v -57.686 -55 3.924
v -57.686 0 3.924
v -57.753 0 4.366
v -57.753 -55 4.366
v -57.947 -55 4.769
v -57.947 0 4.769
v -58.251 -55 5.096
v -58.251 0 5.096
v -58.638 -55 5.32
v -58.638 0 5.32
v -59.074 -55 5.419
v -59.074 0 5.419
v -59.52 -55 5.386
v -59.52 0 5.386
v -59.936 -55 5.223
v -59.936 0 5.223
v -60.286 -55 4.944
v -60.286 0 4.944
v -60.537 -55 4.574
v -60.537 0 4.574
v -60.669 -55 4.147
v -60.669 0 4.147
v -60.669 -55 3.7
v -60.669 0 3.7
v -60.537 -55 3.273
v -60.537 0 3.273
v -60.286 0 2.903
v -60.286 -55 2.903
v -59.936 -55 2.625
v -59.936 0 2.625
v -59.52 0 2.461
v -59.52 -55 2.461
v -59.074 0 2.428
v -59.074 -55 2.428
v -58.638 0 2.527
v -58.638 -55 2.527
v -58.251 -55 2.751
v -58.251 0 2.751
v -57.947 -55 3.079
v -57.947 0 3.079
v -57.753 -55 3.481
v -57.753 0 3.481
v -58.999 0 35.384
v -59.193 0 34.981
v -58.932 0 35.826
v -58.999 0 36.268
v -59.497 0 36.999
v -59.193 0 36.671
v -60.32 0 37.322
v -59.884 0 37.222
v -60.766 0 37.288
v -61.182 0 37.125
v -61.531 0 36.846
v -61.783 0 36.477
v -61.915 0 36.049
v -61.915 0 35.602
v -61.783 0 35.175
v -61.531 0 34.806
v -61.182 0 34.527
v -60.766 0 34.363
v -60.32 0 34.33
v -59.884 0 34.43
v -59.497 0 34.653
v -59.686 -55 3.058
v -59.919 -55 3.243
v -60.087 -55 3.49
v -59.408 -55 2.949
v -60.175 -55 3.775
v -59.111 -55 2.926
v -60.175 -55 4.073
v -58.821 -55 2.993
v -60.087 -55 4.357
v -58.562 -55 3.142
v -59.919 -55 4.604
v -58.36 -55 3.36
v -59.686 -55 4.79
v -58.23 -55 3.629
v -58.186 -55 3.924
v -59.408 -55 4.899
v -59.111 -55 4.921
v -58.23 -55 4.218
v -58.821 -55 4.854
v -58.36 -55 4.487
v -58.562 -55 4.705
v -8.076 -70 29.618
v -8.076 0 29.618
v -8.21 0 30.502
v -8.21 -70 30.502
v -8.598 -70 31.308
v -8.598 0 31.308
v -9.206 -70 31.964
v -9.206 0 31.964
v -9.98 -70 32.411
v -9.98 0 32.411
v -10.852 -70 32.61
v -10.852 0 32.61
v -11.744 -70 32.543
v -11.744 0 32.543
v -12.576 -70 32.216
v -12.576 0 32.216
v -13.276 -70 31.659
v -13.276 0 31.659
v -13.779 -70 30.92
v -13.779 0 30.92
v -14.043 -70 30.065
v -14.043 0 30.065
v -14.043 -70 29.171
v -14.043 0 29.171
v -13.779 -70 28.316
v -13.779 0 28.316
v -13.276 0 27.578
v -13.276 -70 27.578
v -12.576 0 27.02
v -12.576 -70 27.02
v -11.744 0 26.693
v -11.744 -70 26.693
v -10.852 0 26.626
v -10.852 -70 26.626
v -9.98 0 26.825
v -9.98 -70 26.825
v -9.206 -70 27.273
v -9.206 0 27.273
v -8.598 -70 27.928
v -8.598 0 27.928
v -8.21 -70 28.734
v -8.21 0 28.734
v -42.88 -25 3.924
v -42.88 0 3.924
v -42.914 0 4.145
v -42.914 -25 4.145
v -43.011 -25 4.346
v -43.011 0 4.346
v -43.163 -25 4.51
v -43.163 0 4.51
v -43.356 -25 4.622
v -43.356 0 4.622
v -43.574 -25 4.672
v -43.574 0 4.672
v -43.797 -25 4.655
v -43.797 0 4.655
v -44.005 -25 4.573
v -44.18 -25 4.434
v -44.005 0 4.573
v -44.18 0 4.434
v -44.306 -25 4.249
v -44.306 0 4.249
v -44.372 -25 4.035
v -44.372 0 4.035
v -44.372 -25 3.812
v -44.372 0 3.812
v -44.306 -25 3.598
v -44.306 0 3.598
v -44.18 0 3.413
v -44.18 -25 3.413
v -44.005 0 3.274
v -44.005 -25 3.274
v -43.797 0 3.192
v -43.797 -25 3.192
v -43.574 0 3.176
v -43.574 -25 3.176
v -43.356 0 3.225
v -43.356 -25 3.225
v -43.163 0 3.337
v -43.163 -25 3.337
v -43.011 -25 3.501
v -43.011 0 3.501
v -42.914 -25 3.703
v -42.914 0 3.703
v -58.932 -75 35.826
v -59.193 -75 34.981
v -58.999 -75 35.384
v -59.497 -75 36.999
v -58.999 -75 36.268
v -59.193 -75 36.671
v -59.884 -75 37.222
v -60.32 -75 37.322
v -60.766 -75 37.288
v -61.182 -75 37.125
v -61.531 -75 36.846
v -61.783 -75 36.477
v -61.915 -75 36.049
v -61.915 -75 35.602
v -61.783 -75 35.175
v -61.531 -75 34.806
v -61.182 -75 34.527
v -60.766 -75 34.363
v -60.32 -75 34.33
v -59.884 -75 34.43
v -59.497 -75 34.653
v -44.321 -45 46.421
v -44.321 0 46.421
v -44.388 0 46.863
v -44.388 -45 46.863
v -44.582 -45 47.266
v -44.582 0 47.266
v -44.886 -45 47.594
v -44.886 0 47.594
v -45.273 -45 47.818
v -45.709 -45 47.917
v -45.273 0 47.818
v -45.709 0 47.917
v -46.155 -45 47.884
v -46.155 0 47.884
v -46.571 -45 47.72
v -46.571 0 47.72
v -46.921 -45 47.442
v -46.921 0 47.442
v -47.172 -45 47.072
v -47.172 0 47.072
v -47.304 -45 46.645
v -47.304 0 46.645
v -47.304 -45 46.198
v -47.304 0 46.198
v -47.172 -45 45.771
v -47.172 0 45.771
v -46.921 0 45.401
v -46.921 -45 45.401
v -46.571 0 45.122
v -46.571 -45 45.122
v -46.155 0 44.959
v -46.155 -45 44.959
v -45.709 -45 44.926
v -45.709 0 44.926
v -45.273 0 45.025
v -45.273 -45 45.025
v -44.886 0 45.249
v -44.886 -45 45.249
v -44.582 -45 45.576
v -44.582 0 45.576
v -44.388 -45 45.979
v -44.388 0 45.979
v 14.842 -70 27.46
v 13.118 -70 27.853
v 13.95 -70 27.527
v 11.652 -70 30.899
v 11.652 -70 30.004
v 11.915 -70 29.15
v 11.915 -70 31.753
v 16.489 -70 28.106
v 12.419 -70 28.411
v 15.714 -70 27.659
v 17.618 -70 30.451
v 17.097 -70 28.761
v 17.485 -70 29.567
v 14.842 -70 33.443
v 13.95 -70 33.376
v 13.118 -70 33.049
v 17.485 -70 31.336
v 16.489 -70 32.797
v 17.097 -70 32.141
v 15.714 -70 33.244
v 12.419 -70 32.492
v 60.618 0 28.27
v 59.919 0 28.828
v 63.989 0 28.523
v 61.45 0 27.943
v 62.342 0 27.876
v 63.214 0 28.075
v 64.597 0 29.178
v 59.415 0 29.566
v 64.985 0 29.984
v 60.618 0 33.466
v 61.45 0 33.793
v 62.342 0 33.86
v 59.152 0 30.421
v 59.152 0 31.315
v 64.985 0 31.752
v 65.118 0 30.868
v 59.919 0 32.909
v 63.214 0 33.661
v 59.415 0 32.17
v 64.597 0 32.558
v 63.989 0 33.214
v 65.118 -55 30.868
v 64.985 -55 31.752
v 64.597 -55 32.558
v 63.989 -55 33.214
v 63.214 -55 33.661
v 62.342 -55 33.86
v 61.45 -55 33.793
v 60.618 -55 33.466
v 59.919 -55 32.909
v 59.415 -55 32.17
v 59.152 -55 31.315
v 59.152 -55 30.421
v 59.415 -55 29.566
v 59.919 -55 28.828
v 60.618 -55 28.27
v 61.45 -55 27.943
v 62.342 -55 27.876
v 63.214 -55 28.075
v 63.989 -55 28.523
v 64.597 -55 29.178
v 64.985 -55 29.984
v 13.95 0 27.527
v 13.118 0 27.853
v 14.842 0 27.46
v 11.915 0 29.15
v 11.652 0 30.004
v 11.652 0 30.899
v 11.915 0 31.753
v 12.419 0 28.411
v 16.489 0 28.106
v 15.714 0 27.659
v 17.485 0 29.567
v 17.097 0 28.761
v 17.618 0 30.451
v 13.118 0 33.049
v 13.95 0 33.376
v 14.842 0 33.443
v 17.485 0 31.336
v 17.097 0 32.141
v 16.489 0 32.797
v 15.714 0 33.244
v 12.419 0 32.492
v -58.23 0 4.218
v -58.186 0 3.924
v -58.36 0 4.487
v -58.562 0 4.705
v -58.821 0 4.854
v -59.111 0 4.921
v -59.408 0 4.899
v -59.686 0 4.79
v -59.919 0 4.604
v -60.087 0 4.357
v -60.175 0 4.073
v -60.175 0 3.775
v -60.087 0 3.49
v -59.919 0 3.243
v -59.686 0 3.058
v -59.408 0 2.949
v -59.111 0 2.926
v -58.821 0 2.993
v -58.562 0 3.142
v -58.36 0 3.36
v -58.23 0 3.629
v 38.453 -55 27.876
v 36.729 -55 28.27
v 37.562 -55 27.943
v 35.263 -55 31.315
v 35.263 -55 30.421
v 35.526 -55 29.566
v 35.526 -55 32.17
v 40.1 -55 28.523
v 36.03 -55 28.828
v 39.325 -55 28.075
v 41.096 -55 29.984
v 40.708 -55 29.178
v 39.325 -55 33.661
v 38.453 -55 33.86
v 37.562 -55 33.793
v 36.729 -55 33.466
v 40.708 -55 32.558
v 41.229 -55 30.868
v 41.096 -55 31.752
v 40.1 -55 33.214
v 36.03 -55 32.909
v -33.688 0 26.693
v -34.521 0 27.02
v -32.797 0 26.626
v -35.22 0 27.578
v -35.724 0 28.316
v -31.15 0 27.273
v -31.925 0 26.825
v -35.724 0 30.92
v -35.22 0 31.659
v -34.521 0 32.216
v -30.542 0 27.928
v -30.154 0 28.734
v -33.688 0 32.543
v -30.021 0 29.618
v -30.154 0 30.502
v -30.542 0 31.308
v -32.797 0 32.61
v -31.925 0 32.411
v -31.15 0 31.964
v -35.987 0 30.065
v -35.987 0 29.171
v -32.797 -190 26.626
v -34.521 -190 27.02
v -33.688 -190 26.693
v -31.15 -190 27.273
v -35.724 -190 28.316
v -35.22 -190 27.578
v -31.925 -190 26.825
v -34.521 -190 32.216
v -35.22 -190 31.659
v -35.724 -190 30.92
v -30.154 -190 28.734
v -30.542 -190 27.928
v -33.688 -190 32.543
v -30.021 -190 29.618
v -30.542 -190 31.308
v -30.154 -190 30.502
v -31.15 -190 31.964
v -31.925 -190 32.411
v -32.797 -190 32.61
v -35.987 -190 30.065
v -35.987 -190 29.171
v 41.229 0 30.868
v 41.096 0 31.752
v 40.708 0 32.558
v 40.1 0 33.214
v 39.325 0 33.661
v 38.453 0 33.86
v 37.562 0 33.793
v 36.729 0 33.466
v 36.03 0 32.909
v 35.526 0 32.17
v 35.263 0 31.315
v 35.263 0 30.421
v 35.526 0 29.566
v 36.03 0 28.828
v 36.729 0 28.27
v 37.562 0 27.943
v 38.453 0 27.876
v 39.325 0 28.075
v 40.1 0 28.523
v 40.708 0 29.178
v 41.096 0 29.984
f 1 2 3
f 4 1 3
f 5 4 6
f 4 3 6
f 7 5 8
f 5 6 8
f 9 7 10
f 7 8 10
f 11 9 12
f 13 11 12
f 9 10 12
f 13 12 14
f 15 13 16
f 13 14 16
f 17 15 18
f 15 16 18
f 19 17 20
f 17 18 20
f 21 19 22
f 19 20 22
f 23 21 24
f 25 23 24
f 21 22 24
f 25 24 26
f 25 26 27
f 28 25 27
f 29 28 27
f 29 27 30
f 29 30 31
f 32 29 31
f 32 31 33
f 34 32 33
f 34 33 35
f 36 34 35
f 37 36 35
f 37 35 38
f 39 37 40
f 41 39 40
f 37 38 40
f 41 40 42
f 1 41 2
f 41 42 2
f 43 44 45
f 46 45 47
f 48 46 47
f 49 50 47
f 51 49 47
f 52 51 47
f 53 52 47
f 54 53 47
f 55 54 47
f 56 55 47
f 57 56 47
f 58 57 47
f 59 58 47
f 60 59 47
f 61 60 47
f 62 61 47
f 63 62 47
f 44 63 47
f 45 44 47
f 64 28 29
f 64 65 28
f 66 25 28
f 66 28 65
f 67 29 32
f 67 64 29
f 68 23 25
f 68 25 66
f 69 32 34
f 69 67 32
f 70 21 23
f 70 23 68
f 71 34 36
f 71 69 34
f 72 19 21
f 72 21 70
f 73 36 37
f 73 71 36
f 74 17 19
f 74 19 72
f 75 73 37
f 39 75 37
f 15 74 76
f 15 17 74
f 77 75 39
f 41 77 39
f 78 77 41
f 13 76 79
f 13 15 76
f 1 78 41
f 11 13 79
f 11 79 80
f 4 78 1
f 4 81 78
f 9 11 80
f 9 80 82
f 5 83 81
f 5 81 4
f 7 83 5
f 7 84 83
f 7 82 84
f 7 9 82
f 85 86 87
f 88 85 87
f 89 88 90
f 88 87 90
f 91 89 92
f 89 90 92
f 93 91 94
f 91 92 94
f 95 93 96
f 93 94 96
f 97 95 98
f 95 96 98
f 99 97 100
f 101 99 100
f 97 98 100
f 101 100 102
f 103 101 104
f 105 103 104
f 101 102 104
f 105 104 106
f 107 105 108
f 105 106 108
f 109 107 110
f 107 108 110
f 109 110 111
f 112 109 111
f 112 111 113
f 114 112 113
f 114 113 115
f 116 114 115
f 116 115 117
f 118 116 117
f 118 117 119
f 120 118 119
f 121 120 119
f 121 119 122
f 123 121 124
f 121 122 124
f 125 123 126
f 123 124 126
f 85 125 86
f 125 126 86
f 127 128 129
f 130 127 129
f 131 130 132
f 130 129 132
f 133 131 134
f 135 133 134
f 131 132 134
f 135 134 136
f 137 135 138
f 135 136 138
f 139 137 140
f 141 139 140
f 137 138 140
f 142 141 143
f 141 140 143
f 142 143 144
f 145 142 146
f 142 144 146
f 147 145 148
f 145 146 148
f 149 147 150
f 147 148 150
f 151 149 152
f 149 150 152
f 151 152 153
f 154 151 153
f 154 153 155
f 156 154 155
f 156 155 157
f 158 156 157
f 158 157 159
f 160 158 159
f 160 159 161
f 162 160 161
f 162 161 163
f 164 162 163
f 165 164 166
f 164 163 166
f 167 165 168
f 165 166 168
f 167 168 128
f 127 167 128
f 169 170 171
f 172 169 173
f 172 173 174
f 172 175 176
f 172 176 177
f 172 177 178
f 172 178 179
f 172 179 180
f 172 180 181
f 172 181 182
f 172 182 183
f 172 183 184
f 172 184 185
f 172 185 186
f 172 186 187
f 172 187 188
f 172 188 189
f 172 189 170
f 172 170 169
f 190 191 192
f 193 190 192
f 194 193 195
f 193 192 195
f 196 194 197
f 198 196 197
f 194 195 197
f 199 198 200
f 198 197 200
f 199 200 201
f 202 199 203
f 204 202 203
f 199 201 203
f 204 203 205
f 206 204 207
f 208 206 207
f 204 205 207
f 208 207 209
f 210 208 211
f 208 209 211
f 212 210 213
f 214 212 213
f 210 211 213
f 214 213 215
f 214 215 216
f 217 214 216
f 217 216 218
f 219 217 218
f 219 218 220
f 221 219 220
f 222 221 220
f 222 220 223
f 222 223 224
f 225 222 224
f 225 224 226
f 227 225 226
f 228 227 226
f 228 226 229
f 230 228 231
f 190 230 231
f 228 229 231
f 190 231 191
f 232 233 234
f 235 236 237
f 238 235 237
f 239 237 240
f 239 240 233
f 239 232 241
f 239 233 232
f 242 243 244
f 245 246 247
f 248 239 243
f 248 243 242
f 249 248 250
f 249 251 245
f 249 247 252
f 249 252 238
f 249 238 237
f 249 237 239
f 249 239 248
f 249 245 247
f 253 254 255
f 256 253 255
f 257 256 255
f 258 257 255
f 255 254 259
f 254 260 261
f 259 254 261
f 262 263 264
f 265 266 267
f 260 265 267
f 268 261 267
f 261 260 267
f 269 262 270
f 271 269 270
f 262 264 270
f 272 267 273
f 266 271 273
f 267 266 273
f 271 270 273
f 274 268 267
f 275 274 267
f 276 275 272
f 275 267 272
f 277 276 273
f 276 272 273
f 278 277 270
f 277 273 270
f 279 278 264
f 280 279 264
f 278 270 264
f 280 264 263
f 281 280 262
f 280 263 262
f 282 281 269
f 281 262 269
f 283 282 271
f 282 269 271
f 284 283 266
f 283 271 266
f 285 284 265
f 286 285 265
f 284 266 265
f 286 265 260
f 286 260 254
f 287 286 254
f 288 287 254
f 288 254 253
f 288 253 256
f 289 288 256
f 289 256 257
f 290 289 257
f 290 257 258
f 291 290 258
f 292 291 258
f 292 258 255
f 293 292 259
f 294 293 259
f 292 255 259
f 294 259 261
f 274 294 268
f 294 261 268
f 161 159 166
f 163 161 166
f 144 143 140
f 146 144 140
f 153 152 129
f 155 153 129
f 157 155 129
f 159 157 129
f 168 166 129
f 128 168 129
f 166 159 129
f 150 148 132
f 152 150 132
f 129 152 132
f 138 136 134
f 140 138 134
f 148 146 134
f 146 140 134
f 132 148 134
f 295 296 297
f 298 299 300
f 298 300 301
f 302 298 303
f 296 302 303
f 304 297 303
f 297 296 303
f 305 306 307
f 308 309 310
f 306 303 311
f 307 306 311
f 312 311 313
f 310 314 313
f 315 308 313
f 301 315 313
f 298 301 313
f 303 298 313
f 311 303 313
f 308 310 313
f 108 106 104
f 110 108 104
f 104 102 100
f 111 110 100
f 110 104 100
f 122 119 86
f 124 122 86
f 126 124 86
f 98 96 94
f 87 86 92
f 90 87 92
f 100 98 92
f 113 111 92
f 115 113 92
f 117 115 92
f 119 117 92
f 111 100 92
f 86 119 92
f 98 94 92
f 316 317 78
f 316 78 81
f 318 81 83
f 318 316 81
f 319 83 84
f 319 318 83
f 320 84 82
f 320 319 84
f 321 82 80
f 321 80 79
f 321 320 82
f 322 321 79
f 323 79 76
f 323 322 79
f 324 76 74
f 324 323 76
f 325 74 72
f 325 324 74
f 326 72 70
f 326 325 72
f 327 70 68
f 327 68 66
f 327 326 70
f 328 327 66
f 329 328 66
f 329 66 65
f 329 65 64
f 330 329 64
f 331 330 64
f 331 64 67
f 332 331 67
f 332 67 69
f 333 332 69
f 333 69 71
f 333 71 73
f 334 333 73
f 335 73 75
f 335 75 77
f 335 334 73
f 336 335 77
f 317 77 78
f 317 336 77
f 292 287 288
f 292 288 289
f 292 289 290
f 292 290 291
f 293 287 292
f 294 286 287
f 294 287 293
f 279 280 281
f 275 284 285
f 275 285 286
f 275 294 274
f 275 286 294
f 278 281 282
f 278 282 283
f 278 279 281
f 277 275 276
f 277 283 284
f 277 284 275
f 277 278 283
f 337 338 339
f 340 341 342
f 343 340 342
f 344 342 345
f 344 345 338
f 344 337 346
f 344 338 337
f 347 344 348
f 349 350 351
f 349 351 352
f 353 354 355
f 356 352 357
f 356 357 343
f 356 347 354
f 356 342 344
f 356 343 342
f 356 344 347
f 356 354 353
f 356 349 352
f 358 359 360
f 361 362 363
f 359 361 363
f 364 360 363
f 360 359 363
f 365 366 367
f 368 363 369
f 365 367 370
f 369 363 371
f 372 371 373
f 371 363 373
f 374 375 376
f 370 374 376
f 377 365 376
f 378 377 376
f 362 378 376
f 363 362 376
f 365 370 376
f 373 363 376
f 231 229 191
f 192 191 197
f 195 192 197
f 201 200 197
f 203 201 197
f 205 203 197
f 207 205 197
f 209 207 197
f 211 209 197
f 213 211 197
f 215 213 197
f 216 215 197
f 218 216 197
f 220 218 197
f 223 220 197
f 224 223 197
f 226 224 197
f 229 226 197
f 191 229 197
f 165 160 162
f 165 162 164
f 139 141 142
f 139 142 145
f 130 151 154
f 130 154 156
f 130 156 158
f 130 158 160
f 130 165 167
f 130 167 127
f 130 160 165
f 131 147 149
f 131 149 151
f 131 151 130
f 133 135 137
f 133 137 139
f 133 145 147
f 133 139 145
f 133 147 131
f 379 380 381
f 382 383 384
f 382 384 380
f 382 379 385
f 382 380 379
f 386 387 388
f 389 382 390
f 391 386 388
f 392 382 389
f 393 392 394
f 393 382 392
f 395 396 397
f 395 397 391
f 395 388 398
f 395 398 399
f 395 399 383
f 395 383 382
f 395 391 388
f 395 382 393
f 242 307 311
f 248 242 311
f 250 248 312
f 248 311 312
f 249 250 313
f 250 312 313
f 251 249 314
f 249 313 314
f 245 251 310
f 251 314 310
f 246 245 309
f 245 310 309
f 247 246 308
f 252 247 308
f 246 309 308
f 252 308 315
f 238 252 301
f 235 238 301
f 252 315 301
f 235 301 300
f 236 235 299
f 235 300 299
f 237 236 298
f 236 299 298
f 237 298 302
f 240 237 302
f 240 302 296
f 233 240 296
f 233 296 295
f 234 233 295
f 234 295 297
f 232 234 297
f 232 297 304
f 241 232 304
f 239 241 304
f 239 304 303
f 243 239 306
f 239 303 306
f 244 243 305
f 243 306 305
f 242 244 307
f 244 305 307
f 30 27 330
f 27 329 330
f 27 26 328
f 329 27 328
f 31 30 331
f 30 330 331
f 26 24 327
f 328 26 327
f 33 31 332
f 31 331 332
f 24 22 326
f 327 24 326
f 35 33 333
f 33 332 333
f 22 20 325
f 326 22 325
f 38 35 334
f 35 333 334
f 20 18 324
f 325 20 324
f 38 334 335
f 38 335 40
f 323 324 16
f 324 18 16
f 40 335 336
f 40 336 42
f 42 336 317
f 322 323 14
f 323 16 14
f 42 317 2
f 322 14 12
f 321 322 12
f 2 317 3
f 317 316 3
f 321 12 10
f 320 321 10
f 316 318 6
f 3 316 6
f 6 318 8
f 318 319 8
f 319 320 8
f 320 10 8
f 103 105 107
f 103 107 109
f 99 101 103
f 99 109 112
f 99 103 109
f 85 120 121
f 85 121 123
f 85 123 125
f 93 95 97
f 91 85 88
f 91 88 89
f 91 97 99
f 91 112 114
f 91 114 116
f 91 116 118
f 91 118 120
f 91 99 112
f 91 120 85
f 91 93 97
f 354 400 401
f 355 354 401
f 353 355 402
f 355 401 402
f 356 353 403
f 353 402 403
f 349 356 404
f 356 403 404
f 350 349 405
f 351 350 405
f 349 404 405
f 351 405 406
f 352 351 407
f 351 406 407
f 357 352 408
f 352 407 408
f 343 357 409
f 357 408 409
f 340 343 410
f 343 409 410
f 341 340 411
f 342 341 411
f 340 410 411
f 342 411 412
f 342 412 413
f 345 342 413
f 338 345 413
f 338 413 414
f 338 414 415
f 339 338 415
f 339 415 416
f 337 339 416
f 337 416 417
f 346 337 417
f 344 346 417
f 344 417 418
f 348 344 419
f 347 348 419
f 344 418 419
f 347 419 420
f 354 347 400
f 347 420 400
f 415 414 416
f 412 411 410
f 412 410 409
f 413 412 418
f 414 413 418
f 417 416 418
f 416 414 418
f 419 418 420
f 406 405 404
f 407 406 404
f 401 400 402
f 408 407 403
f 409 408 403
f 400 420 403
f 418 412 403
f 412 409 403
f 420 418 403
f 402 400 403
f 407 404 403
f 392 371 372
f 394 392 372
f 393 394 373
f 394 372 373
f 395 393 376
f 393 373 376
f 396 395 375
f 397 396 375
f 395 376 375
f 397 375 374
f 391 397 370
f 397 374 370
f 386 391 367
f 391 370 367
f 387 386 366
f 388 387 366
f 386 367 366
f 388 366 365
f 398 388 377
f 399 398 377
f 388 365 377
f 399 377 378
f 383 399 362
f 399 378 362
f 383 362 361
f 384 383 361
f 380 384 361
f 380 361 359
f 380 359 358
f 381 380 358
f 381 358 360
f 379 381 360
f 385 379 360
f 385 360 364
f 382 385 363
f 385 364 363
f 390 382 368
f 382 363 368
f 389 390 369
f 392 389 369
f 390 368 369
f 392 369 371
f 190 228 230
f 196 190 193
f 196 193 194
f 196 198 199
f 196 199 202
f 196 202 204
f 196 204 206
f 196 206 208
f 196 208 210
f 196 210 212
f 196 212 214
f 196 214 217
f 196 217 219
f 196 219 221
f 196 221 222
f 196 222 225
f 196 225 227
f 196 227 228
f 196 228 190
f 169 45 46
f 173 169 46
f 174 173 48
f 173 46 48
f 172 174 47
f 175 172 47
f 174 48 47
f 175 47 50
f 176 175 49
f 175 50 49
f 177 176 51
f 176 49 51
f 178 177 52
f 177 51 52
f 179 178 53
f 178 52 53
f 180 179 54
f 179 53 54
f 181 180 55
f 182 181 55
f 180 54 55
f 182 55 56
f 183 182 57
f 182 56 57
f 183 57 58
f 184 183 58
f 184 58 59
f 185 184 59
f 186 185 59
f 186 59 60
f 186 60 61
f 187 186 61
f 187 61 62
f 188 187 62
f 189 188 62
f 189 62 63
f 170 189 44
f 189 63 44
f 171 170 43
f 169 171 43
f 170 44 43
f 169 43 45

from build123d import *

# Parameters (mm, degrees)
F0_R     = 3
F1_DEPTH = 190
F2_DEPTH = 70
F3_DEPTH = 55
F4_DEPTH = 55
F0_R_2   = 1.5
F5_DEPTH = 75
F6_DEPTH = 45
F0_R_3   = 1
F7_DEPTH = 55
F0_R_4   = 0.75
F8_DEPTH = 25


with BuildPart() as f1:
    # F0 (on Front) → F1 (new body)
    with BuildSketch(Plane.XZ):
        with Locations((-33.020835, 29.618056)):
            Circle(F0_R)
    extrude(amount=F1_DEPTH)


with BuildPart() as f2:
    # F0 (on Front) → F2 (new body)
    with BuildSketch(Plane.XZ):
        with Locations((-11.07639, 29.618056)):
            Circle(F0_R)
        with Locations((14.618056, 30.451389)):
            Circle(F0_R)
    extrude(amount=F2_DEPTH)


with BuildPart() as f3:
    # F0 (on Front) → F3 (new body)
    with BuildSketch(Plane.XZ):
        with Locations((38.229167, 30.868057)):
            Circle(F0_R)
    extrude(amount=F3_DEPTH)


with BuildPart() as f4:
    # F0 (on Front) → F4 (new body)
    with BuildSketch(Plane.XZ):
        with Locations((62.118057, 30.868057)):
            Circle(F0_R)
    extrude(amount=F4_DEPTH)


with BuildPart() as f5:
    # F0 (on Front) → F5 (new body)
    with BuildSketch(Plane.XZ):
        with Locations((-60.43186, 35.825823)):
            Circle(F0_R_2)
    extrude(amount=F5_DEPTH)


with BuildPart() as f6:
    # F0 (on Front) → F6 (new body)
    with BuildSketch(Plane.XZ):
        with Locations((-45.820963, 46.421356)):
            Circle(F0_R_2)
    extrude(amount=F6_DEPTH)


with BuildPart() as f7:
    # F0 (on Front) → F7 (new body)
    with BuildSketch(Plane.XZ):
        with Locations((-59.185926, 3.923611)):
            Circle(F0_R_2)
        with Locations((-59.185926, 3.923611)):
            Circle(F0_R_3, mode=Mode.SUBTRACT)
    extrude(amount=F7_DEPTH)


with BuildPart() as f8:
    # F0 (on Front) → F8 (new body)
    with BuildSketch(Plane.XZ):
        with Locations((-43.630369, 3.923611)):
            Circle(F0_R_4)
    extrude(amount=F8_DEPTH)


solid = Compound([f1.part, f2.part, f3.part, f4.part, f5.part, f6.part, f7.part, f8.part])
